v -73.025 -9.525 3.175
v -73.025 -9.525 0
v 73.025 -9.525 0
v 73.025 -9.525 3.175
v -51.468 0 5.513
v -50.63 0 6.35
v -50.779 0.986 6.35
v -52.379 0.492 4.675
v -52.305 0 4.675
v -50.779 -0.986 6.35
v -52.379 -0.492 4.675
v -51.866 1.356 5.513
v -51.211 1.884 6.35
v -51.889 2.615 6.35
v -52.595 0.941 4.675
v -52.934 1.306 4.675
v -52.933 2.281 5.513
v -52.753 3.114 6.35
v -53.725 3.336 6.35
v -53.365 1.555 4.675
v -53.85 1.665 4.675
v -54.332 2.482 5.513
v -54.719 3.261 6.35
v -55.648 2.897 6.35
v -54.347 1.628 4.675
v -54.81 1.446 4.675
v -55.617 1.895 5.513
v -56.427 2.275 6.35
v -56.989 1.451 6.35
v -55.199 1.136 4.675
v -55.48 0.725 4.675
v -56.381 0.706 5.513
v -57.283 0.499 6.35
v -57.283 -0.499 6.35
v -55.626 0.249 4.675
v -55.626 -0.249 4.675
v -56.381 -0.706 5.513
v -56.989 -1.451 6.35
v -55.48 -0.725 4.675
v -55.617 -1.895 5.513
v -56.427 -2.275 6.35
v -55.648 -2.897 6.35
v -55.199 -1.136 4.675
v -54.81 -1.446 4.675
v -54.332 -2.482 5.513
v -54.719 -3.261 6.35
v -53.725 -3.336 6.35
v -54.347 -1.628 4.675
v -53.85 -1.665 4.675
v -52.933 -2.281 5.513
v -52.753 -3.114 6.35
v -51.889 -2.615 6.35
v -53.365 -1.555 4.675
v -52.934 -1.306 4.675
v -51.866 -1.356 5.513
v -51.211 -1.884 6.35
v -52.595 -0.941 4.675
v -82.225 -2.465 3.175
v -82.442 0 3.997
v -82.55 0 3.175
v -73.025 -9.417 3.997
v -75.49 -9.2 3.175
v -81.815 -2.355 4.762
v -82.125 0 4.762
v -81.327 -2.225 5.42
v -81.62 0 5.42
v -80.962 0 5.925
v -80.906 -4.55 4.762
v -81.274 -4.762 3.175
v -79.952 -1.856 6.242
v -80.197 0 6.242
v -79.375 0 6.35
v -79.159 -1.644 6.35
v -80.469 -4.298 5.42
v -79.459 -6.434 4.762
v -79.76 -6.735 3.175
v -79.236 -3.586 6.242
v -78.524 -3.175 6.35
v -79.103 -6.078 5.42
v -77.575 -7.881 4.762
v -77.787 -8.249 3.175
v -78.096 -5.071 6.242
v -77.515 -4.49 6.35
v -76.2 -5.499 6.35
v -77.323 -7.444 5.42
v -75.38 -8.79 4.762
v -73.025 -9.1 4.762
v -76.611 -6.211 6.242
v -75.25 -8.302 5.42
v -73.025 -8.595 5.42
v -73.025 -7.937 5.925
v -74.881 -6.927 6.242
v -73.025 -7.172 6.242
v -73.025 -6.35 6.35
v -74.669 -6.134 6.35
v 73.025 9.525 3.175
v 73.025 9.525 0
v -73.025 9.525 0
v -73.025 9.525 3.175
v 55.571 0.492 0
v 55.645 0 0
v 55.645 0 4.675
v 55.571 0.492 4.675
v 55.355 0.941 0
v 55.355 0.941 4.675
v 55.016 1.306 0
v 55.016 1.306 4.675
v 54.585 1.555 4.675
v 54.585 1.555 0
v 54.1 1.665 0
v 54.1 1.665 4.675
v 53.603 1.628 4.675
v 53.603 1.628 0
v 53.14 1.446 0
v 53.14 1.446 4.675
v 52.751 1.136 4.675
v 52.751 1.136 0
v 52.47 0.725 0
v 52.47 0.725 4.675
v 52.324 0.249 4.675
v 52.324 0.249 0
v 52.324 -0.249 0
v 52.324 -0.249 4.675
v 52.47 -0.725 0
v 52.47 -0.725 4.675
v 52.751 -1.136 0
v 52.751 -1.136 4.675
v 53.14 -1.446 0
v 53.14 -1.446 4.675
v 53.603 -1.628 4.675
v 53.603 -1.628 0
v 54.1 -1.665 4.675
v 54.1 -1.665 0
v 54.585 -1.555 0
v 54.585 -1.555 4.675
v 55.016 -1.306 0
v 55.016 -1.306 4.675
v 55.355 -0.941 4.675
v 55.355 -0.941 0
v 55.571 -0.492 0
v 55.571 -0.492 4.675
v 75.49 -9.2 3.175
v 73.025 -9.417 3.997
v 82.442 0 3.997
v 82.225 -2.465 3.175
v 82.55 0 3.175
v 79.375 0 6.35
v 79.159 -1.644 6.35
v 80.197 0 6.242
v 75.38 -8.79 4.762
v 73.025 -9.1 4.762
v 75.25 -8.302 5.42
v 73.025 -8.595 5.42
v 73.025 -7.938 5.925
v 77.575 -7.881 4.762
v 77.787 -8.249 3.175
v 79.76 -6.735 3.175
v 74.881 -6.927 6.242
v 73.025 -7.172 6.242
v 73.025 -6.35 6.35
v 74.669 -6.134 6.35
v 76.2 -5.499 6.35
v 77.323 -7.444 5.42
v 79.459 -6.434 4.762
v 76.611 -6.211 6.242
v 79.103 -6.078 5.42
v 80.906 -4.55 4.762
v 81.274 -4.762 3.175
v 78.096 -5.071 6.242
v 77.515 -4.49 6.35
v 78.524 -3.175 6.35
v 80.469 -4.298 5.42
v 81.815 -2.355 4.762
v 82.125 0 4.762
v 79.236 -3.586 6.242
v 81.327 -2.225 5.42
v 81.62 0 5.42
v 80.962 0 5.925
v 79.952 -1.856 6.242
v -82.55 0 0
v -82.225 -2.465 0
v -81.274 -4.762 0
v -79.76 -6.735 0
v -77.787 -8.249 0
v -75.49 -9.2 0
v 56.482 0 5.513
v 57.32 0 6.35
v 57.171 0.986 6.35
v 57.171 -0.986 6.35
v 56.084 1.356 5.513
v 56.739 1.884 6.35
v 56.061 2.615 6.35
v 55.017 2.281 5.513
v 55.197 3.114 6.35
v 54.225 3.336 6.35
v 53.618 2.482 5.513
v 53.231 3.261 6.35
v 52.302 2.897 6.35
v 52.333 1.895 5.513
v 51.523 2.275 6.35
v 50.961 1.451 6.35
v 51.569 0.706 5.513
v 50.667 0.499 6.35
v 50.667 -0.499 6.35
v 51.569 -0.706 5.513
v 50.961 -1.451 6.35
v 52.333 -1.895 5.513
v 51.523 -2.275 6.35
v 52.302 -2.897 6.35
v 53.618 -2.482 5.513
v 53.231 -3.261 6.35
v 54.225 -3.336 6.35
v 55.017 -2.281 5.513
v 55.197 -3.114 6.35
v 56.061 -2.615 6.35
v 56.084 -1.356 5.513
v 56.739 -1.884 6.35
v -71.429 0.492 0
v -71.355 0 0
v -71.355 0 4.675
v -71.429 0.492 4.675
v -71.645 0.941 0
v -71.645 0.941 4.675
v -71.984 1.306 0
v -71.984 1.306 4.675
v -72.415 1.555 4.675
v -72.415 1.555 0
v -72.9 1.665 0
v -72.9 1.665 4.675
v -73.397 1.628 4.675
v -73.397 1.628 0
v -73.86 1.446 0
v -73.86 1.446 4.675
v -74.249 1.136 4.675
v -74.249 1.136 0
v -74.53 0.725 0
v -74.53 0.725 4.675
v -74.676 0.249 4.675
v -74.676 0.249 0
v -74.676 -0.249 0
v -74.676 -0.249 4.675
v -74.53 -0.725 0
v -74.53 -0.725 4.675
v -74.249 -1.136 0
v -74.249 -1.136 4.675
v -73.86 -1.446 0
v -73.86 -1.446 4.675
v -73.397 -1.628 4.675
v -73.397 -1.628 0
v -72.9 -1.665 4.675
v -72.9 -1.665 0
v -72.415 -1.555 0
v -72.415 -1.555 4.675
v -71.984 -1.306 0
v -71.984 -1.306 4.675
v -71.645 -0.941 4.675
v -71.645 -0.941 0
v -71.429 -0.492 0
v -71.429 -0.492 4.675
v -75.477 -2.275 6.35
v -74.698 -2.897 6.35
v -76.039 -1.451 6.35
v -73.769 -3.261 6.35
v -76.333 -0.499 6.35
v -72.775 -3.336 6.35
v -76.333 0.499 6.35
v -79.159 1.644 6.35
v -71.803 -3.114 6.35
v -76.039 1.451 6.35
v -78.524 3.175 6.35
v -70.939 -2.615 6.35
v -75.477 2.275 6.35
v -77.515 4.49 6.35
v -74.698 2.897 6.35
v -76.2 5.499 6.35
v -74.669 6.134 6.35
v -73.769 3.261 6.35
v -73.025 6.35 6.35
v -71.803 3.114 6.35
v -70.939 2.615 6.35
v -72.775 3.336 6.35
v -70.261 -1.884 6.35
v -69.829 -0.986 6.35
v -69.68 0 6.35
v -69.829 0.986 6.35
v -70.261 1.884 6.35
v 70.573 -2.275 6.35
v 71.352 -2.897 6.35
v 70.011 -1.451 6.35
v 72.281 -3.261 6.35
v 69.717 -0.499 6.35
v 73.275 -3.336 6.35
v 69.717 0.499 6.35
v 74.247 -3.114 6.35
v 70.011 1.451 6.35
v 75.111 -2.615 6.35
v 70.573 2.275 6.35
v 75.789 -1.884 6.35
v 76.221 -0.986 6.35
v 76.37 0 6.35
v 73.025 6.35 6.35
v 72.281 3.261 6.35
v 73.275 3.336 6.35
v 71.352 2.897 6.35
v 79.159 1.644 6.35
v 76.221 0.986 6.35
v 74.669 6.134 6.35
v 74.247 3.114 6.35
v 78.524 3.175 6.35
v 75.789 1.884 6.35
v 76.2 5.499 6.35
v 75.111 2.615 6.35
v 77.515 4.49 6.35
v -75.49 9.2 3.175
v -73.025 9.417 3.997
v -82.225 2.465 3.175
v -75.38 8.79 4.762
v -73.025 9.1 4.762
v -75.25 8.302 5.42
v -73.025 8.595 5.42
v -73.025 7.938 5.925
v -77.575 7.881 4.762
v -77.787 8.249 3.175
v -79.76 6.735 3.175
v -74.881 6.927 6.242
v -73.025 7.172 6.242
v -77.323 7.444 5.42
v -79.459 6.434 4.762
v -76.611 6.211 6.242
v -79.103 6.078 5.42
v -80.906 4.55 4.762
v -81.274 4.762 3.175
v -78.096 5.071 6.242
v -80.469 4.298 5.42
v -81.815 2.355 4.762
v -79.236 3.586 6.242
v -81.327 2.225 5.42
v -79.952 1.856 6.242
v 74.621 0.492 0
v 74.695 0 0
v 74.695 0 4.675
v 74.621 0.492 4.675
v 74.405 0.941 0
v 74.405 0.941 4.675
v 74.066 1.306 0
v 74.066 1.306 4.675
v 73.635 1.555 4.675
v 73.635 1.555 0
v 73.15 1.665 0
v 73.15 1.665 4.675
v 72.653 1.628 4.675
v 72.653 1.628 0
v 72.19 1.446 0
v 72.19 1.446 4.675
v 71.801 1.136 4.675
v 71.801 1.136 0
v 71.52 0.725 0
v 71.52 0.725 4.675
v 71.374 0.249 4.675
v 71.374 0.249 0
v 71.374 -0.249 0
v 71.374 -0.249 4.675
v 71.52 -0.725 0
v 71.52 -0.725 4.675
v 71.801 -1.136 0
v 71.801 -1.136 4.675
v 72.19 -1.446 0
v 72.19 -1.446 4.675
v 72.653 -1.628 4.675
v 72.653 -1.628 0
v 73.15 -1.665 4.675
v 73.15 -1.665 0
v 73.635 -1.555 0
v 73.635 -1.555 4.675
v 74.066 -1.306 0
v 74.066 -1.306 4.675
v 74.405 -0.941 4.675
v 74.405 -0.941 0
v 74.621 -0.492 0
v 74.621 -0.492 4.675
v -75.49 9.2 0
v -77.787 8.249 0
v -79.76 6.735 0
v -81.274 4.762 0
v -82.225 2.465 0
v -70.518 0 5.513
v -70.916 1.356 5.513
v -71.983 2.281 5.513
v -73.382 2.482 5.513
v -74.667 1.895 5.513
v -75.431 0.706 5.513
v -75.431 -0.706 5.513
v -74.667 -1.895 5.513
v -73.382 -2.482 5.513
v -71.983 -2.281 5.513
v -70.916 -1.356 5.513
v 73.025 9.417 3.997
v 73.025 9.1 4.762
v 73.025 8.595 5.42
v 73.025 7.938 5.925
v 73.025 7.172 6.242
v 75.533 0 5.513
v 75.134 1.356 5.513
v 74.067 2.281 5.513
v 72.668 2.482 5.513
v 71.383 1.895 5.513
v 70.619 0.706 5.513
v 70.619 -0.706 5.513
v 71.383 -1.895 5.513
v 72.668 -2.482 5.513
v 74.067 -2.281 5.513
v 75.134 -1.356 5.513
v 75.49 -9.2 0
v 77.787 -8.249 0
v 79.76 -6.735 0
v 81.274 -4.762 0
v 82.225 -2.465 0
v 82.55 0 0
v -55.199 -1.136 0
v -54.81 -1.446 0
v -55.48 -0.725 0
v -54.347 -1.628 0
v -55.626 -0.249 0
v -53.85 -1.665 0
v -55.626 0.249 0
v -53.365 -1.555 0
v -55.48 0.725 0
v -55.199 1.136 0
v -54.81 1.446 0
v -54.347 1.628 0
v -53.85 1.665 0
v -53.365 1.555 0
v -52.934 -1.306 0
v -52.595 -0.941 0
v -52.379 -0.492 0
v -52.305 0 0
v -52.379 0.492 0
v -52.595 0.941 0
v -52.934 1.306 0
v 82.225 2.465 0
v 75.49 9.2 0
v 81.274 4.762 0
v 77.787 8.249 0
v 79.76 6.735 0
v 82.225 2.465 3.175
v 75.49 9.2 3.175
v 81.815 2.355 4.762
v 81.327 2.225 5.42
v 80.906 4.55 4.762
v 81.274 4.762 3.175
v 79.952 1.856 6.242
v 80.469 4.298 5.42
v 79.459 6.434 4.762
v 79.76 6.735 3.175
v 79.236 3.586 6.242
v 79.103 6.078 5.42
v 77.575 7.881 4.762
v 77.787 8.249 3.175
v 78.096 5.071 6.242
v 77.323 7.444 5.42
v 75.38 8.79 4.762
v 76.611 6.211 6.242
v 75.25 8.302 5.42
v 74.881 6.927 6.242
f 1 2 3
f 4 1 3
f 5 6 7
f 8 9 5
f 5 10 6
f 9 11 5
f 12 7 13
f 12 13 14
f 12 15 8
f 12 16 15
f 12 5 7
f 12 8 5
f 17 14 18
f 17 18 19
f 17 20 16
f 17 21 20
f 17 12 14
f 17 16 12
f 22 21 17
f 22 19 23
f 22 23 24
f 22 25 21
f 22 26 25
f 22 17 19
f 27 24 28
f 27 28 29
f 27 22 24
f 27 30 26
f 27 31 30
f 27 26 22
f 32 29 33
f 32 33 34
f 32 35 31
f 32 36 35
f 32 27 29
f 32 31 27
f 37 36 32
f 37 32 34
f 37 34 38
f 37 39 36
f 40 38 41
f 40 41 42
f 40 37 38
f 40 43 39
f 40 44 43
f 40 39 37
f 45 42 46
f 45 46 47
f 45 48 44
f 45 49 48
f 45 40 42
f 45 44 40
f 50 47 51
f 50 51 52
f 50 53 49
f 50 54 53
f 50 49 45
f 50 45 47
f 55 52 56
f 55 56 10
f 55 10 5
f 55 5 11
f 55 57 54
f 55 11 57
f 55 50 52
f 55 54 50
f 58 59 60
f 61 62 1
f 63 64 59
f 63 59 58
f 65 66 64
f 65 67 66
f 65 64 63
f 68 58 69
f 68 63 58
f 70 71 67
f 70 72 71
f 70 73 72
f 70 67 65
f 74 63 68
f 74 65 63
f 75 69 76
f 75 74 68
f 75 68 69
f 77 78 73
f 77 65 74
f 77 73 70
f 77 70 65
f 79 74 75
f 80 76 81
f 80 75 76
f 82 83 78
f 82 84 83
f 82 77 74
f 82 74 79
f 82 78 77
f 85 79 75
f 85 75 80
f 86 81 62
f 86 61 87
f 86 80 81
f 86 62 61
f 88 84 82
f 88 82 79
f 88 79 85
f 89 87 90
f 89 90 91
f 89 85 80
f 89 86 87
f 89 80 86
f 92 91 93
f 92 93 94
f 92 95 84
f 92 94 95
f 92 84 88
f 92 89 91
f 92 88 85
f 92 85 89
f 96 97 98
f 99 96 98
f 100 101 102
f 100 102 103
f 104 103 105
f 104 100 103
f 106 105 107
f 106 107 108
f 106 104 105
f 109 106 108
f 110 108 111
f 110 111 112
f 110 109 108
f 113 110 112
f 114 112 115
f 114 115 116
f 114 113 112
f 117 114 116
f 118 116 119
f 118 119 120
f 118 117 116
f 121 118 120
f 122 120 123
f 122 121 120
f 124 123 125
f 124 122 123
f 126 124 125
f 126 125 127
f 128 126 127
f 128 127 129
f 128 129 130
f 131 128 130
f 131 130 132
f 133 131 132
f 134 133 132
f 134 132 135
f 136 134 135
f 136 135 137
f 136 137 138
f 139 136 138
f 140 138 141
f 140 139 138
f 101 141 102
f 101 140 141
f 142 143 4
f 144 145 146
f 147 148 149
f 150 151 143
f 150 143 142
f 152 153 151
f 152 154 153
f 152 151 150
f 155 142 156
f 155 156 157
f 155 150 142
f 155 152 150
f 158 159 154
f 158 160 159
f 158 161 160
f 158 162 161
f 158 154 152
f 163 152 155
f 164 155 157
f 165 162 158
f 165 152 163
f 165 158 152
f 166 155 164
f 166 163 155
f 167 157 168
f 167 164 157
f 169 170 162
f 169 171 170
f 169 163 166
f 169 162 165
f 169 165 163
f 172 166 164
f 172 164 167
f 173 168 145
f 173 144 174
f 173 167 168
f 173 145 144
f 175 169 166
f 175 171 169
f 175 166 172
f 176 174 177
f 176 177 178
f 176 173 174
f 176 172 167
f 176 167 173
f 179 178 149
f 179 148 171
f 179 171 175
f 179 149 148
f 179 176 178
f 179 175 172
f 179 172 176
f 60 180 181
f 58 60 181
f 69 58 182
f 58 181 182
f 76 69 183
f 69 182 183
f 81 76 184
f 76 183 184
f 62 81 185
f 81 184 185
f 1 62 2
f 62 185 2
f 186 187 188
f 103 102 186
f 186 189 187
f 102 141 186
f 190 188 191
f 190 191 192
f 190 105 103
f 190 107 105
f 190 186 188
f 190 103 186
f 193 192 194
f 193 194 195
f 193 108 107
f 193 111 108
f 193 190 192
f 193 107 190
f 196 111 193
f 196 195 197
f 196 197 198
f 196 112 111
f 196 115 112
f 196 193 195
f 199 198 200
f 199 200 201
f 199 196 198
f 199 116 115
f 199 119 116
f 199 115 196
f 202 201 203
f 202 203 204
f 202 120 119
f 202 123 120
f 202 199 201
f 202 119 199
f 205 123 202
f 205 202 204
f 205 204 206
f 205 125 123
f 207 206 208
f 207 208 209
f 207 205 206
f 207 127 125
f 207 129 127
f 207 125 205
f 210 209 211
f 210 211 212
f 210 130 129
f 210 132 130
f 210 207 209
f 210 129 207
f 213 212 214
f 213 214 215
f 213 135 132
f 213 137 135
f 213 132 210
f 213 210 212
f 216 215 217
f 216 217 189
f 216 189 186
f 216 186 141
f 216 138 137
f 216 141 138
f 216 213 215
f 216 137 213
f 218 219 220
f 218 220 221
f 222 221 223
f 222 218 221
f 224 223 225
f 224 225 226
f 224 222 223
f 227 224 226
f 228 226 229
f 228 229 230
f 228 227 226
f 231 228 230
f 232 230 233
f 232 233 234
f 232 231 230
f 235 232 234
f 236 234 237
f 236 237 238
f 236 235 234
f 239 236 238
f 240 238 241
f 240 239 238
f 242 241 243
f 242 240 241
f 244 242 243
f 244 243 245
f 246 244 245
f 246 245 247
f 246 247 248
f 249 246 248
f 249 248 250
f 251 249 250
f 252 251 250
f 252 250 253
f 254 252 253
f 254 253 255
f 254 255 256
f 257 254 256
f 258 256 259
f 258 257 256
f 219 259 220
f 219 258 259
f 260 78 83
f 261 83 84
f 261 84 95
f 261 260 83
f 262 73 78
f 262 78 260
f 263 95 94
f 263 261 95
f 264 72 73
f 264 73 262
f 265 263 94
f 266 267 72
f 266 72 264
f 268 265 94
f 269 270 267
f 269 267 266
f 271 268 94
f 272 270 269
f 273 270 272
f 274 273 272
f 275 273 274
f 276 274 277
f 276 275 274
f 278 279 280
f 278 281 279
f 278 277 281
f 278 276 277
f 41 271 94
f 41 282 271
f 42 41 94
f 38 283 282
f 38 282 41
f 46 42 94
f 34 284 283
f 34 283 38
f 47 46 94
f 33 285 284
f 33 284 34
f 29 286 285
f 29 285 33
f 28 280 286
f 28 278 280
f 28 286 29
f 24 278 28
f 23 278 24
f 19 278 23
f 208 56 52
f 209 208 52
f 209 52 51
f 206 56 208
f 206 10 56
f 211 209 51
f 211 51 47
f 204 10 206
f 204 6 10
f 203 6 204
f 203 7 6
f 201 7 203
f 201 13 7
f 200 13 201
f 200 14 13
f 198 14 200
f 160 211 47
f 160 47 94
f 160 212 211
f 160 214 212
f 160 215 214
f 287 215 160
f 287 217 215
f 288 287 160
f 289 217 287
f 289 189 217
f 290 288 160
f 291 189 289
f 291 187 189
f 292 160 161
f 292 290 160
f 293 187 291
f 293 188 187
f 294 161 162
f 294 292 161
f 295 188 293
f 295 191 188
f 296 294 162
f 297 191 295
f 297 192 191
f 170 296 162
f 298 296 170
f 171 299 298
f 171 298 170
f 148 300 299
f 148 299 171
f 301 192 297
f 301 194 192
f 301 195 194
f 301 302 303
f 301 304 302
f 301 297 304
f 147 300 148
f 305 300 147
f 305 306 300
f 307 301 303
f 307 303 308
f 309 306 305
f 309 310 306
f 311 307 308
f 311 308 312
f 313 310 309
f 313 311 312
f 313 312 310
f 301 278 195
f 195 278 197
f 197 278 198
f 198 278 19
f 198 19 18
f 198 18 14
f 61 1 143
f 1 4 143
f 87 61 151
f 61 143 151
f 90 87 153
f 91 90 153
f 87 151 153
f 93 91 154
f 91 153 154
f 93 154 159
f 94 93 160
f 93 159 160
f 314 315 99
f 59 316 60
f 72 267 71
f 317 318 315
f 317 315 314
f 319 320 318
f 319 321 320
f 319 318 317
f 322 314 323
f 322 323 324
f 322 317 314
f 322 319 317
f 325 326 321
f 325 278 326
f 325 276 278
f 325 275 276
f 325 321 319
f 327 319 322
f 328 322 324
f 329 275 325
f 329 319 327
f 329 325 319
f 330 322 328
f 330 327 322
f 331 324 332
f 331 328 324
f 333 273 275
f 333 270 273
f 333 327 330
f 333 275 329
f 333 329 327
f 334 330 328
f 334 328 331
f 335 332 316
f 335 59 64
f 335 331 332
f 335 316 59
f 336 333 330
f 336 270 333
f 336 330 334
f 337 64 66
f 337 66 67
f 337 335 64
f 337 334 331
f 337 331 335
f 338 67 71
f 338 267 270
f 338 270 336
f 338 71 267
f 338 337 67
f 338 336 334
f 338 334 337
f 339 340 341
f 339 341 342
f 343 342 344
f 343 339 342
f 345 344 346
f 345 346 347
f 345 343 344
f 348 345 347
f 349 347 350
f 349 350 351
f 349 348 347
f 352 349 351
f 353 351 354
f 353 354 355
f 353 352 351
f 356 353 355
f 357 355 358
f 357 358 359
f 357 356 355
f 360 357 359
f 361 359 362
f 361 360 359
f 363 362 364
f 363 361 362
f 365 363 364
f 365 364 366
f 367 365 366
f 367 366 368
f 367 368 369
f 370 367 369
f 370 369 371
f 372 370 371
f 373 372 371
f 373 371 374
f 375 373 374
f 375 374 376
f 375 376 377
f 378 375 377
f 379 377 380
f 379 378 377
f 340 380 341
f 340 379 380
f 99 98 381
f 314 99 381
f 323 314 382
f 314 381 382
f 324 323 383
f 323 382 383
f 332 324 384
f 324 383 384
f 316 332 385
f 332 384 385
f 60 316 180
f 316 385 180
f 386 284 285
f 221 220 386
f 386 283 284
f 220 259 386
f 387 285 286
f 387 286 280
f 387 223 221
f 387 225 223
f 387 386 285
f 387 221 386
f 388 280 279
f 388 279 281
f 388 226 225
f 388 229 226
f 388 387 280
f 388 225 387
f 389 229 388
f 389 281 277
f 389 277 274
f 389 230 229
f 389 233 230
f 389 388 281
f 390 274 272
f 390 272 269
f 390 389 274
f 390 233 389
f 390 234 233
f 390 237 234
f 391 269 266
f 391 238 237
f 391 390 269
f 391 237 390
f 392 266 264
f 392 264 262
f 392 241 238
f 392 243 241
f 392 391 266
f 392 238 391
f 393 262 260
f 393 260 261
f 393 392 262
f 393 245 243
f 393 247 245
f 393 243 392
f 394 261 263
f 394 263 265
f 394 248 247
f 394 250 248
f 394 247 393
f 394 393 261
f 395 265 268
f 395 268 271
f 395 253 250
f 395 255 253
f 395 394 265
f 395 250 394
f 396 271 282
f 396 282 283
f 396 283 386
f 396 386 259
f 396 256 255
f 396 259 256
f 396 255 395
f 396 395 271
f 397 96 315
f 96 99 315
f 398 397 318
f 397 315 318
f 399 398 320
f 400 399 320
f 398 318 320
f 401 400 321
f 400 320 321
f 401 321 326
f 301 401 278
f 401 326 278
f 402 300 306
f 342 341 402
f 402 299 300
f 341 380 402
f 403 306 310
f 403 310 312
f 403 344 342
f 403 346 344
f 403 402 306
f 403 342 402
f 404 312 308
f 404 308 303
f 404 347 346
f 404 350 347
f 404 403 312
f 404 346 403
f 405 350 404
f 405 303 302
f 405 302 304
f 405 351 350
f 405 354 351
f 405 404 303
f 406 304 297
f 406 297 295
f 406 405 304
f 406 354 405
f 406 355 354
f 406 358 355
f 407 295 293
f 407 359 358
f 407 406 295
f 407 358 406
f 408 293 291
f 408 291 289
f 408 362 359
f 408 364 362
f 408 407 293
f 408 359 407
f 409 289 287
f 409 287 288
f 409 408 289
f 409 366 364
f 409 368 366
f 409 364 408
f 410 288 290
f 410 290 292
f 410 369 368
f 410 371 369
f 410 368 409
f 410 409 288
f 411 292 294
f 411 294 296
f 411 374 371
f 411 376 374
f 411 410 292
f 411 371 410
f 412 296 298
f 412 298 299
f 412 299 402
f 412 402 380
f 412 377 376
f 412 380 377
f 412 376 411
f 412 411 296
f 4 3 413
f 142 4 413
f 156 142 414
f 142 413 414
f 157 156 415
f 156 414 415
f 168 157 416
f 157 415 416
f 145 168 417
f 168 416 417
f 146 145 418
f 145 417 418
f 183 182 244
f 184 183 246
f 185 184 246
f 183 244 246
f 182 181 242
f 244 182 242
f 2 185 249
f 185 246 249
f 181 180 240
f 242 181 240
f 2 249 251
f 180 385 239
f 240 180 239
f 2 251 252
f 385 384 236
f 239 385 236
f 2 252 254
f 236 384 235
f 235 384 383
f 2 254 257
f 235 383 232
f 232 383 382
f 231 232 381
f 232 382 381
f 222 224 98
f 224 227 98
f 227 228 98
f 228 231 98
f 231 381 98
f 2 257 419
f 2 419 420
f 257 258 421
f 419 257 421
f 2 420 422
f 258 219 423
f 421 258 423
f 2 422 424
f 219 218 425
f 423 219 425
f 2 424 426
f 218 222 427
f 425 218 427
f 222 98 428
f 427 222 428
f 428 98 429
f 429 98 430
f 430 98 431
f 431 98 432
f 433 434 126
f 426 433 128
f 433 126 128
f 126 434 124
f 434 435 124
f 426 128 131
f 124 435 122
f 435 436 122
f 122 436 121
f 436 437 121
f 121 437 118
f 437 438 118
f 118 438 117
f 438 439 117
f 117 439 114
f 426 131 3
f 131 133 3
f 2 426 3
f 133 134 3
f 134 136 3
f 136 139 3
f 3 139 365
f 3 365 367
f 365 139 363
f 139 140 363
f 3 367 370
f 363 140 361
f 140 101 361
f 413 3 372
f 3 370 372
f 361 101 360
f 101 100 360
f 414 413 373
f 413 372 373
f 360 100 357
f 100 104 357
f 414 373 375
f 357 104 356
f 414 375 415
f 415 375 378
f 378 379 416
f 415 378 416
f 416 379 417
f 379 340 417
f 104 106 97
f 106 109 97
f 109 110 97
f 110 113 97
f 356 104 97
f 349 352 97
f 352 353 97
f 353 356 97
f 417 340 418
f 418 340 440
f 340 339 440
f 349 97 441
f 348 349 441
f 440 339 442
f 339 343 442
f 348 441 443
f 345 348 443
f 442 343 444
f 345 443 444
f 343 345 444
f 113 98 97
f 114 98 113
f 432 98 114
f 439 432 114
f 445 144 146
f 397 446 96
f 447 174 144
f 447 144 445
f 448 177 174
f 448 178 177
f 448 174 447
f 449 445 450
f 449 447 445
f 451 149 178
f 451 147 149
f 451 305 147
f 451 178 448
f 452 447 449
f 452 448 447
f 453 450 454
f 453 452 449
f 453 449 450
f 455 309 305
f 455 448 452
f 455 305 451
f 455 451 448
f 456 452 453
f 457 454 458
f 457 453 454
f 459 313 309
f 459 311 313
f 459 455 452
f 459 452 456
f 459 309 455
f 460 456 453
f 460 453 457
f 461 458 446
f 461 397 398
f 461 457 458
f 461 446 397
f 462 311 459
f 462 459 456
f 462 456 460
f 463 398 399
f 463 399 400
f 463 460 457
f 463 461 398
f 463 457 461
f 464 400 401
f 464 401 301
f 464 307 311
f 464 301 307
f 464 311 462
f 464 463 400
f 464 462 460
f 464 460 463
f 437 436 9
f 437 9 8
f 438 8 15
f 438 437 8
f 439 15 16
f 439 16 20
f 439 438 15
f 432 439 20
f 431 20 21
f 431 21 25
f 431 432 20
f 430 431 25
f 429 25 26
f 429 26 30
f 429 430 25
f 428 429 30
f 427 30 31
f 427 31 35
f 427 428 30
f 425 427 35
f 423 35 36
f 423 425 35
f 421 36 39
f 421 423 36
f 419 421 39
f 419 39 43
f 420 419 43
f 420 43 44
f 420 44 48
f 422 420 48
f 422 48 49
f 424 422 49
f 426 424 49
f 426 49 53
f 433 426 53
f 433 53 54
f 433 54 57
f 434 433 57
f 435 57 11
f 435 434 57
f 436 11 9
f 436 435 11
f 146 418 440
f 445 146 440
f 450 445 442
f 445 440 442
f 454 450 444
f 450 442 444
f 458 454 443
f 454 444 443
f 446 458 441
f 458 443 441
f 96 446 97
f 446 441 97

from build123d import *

# Parameters (mm, degrees)
F0_R     = 1.67
F1_DEPTH = 6.35
F2_R     = 3.175
F3_SIZE  = 1.675


with BuildPart() as f1:
    # F0 (on Top) → F1 (new body)
    with BuildSketch(Plane.XY):
        with BuildLine():
            Line((73.025, 9.525), (63.5, 9.525))
            Line((63.5, 9.525), (-63.5, 9.525))
            Line((-63.5, 9.525), (-73.025, 9.525))
            ThreePointArc((-73.025, 9.525), (-79.7601920908, 6.7351920908), (-82.55, 0))
            ThreePointArc((-82.55, 0), (-79.7601920908, -6.7351920908), (-73.025, -9.525))
            Line((-73.025, -9.525), (-63.5, -9.525))
            Line((-63.5, -9.525), (63.5, -9.525))
            Line((63.5, -9.525), (73.025, -9.525))
            ThreePointArc((73.025, -9.525), (79.7601920908, -6.7351920908), (82.55, 0))
            ThreePointArc((82.55, 0), (79.7601920908, 6.7351920908), (73.025, 9.525))
        make_face()
        with Locations((-73.025, 0)):
            Circle(F0_R, mode=Mode.SUBTRACT)
        with Locations((-53.975, 0)):
            Circle(F0_R, mode=Mode.SUBTRACT)
        with Locations((53.975, 0)):
            Circle(F0_R, mode=Mode.SUBTRACT)
        with Locations((73.025, 0)):
            Circle(F0_R, mode=Mode.SUBTRACT)
    extrude(amount=F1_DEPTH)

    # F2
    f2_edges = [f1.edges().sort_by_distance(p)[0] for p in [
        (-82.55, 0, 6.35),
        (82.55, 0, 6.35),
        (0, 9.525, 6.35),
        (0, -9.525, 6.35),
    ]]
    fillet(f2_edges, radius=F2_R)

    # F3
    f3_edges = [f1.edges().sort_by_distance(p)[0] for p in [
        (-74.695, 0, 6.35),
        (-55.645, 0, 6.35),
        (52.305, 0, 6.35),
        (71.355, 0, 6.35),
    ]]
    chamfer(f3_edges, length=F3_SIZE)


solid = f1.part
